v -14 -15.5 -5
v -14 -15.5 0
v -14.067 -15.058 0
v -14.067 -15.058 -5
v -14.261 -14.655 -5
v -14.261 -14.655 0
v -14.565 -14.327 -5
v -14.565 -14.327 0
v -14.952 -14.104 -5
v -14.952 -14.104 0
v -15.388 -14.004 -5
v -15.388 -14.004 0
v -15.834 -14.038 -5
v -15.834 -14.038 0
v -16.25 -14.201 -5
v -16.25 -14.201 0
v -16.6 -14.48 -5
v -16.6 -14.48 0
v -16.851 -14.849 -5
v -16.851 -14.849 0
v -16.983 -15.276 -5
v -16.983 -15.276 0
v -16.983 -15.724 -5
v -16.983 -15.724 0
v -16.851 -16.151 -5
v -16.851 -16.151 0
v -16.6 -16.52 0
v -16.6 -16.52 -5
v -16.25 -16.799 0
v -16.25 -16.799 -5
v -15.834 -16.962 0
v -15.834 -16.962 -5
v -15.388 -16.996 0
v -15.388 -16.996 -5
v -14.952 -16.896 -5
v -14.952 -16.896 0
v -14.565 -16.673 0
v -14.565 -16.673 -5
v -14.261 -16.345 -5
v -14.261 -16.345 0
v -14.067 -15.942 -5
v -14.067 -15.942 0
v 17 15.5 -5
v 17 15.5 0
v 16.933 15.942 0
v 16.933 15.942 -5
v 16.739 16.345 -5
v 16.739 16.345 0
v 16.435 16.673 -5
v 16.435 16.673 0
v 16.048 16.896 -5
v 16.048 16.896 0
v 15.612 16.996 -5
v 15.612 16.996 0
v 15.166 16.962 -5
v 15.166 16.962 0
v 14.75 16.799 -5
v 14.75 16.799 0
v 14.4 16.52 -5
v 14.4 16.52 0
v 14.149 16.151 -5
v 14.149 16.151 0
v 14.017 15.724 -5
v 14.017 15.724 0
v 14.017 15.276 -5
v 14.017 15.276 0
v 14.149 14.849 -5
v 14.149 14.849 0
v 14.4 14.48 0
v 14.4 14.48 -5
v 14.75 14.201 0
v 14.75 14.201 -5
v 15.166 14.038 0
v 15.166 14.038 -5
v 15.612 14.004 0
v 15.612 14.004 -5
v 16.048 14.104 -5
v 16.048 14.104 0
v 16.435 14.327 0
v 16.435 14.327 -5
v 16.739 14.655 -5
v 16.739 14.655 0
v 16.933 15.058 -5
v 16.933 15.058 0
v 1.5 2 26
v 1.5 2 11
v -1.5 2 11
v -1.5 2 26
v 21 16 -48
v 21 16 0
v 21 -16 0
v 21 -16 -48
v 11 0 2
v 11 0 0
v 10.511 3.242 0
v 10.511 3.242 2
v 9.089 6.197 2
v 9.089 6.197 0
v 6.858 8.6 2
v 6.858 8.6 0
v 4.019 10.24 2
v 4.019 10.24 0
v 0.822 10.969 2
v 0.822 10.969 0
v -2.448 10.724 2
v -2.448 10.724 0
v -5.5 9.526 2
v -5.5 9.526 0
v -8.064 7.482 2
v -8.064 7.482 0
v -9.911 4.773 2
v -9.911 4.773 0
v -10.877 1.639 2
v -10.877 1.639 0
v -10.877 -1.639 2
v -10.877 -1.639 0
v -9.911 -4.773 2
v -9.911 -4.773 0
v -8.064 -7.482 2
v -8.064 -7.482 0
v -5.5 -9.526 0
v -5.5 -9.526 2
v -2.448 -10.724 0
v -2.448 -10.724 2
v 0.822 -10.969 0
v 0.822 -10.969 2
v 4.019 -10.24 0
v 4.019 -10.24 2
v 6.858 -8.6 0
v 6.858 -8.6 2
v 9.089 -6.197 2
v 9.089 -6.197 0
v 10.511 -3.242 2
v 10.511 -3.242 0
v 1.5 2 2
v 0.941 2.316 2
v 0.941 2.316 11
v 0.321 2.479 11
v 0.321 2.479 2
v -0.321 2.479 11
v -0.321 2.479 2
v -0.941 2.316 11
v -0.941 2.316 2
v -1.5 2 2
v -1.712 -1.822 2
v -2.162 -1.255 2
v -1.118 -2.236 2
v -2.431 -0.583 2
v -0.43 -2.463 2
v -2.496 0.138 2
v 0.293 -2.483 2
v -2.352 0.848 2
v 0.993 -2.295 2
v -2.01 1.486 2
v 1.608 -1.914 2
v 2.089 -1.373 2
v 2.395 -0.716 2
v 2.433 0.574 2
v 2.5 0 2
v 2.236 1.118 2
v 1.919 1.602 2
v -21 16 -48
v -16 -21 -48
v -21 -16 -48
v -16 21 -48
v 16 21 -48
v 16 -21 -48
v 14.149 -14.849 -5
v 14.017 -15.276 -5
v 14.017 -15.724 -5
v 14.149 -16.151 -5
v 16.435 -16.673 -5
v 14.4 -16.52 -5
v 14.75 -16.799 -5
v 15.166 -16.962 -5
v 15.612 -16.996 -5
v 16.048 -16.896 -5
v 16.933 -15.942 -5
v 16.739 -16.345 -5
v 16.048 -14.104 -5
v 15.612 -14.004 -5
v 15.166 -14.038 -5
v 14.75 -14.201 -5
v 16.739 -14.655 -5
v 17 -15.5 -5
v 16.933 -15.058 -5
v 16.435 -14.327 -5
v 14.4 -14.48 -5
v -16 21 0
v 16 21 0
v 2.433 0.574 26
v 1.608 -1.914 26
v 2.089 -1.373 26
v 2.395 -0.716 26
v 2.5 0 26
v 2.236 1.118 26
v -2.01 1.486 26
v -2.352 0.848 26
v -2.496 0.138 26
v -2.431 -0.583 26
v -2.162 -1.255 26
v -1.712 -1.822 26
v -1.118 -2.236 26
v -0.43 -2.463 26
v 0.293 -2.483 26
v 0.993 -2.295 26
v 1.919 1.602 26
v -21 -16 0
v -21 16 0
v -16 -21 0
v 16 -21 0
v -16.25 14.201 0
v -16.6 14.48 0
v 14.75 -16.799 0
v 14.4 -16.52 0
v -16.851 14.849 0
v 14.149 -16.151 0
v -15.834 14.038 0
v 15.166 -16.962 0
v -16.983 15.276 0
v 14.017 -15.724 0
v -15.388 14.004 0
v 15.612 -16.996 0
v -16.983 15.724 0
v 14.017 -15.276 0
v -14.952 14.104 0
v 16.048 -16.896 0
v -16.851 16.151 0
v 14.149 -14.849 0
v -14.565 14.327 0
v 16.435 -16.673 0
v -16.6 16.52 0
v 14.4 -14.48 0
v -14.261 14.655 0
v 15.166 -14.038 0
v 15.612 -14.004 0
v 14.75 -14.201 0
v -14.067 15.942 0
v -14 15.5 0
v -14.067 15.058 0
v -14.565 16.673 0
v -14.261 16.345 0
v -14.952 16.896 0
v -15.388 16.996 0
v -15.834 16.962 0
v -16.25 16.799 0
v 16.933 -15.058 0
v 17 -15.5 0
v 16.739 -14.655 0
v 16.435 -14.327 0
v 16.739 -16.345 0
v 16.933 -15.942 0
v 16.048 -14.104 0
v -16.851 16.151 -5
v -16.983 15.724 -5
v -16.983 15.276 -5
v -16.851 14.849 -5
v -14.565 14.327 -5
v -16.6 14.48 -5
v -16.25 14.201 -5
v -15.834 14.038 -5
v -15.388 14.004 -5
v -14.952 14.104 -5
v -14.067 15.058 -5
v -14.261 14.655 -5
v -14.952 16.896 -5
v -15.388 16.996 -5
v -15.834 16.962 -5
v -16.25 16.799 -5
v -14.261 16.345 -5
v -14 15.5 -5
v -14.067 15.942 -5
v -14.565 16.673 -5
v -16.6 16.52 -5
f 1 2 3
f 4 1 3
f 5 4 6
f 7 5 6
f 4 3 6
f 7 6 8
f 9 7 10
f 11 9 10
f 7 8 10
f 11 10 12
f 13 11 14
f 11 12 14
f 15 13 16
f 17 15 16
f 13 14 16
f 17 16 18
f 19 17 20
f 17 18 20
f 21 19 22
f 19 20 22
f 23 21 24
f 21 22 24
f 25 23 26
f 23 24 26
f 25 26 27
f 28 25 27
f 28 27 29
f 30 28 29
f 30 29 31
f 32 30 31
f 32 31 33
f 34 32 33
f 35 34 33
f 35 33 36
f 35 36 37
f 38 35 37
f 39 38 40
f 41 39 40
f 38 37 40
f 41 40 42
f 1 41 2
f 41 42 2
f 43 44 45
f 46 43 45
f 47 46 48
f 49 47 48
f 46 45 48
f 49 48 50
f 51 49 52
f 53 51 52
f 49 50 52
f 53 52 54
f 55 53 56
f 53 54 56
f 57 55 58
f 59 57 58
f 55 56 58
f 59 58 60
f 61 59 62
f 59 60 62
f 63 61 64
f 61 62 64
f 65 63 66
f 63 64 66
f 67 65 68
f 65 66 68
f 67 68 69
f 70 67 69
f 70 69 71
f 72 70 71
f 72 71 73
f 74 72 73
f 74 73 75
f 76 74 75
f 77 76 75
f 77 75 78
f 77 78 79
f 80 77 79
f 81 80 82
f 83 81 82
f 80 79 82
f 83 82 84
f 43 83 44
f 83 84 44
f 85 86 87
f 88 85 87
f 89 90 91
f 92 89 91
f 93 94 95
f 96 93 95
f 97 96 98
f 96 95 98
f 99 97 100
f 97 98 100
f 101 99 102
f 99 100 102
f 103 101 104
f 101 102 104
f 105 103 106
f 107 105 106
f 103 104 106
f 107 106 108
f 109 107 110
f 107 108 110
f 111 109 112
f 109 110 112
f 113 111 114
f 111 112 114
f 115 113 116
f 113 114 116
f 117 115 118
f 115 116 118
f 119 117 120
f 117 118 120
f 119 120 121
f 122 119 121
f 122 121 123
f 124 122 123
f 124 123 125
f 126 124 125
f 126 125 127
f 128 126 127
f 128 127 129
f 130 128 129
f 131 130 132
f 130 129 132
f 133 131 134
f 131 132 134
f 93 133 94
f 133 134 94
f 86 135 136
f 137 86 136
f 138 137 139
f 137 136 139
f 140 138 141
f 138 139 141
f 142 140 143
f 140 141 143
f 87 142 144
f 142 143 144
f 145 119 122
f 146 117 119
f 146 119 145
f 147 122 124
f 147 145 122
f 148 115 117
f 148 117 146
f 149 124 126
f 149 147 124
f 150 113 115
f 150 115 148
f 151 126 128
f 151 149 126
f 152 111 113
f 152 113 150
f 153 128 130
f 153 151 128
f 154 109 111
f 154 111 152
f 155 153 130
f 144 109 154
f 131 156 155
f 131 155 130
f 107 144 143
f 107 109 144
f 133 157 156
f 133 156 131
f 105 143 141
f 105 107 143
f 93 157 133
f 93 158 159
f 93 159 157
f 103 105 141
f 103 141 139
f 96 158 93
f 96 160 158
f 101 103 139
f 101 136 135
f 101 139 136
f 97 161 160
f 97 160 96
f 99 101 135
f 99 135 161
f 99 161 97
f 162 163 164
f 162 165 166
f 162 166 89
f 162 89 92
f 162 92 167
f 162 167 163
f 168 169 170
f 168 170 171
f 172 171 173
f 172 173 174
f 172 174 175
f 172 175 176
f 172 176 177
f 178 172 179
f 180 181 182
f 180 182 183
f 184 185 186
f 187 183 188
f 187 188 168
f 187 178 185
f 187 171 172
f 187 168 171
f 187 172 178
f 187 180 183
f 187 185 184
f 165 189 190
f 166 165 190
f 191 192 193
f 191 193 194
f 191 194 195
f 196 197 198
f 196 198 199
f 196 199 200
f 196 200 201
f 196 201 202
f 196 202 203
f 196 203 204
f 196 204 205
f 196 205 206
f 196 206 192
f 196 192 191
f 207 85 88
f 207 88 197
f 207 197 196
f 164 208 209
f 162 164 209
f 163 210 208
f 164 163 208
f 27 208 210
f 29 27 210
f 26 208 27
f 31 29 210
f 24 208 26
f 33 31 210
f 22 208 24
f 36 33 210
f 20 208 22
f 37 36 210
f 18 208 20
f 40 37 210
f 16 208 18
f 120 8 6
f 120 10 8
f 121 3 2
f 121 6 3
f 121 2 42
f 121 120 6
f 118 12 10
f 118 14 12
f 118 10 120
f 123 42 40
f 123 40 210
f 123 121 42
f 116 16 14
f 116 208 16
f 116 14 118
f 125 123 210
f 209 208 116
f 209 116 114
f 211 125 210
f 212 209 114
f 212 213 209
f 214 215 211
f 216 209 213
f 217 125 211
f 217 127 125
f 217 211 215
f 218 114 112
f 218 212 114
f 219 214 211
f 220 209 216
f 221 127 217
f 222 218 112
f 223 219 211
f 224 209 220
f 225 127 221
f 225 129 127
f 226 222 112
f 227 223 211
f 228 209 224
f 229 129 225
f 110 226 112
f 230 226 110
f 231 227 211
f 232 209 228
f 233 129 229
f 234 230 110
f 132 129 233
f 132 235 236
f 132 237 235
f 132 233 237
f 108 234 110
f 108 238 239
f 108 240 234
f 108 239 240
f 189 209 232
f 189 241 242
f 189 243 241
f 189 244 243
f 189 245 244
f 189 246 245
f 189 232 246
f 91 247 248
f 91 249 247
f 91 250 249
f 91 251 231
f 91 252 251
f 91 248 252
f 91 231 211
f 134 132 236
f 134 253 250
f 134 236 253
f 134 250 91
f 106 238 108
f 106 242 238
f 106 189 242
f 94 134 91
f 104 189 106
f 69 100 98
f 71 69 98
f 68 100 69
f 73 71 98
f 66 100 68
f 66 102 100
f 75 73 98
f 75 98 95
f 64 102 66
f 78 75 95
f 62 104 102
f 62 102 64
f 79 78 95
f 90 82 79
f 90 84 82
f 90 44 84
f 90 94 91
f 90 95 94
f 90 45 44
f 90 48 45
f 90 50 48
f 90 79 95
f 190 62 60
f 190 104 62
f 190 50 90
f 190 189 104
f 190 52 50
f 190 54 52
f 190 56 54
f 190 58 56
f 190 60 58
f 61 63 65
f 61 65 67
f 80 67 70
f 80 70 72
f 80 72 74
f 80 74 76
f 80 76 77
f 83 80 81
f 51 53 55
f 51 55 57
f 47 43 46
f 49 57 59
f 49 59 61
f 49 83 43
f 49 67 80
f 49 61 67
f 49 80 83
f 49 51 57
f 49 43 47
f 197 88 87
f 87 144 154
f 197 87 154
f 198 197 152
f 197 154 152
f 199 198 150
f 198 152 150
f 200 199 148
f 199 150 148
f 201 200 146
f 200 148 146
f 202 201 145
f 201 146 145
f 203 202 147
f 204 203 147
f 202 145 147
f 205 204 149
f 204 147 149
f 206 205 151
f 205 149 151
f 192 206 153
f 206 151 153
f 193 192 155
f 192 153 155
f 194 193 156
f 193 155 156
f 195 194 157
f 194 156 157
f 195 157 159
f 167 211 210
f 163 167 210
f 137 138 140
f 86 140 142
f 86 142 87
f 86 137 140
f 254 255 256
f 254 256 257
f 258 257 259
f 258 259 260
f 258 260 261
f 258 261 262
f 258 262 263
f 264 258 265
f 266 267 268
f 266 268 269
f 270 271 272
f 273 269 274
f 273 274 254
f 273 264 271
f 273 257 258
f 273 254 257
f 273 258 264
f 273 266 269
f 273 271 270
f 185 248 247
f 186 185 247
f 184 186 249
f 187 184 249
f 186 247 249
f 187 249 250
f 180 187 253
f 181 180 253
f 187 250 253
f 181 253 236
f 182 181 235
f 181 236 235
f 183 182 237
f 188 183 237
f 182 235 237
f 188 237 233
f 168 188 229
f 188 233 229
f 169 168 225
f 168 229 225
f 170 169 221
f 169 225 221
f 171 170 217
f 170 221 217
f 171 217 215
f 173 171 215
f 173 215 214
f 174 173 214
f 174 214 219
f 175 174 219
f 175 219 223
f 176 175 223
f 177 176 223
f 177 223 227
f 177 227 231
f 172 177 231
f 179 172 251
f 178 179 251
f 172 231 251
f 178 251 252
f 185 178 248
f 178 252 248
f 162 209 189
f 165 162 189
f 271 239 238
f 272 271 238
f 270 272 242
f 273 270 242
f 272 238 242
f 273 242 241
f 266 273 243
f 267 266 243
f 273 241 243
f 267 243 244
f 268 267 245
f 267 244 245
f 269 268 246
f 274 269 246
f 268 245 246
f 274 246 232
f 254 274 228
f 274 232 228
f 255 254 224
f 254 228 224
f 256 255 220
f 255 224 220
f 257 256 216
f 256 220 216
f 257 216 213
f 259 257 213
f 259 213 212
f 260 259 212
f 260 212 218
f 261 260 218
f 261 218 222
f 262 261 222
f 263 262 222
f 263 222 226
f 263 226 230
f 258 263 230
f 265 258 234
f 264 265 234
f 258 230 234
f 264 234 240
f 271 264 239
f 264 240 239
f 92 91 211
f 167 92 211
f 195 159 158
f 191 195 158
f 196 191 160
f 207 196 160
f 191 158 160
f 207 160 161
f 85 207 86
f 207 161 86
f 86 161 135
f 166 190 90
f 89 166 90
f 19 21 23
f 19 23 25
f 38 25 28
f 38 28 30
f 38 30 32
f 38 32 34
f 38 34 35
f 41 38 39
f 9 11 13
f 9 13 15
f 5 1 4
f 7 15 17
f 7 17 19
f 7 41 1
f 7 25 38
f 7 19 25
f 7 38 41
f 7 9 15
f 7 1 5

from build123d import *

# Parameters (mm, degrees)
BOSS_EXTRUDE1_DEPTH = 48
SKETCH1_3_R         = 11
BOSS_EXTRUDE2_DEPTH = 2
BOSS_EXTRUDE3_DEPTH = 26
BOSS_EXTRUDE4_DEPTH = 11
SKETCH1_6_R         = 1.5
CUT_EXTRUDE1_DEPTH  = 5


with BuildPart() as part:
    # Sketch1 → Boss-Extrude1 (new body)
    with BuildSketch(Plane.XY):
        Polygon((-16, -21), (16, -21), (21, -16), (21, 16), (16, 21), (-16, 21), (-21, 16), (-21, -16), align=None)
    extrude(amount=-BOSS_EXTRUDE1_DEPTH)

    # Sketch1<3> → Boss-Extrude2 (add)
    with BuildSketch(Plane.XY):
        Circle(SKETCH1_3_R)
        with BuildLine():
            ThreePointArc((2.5, 0), (-1.118033989, -2.236067977), (-1.5, 2))
            ThreePointArc((-1.5, 2), (0, 2.5), (1.5, 2))
            ThreePointArc((1.5, 2), (2.236067977, 1.118033989), (2.5, 0))
        make_face(mode=Mode.SUBTRACT)
    extrude(amount=BOSS_EXTRUDE2_DEPTH)

    # Sketch1<4> → Boss-Extrude3 (add)
    with BuildSketch(Plane.XY):
        with BuildLine():
            Line((1.5, 2), (-1.5, 2))
            ThreePointArc((-1.5, 2), (-1.118033989, -2.236067977), (2.5, 0))
            ThreePointArc((2.5, 0), (2.236067977, 1.118033989), (1.5, 2))
        make_face()
    extrude(amount=BOSS_EXTRUDE3_DEPTH)

    # Sketch1<5> → Boss-Extrude4 (add)
    with BuildSketch(Plane.XY):
        with BuildLine():
            ThreePointArc((1.5, 2), (0, 2.5), (-1.5, 2))
            Line((-1.5, 2), (1.5, 2))
        make_face()
    extrude(amount=BOSS_EXTRUDE4_DEPTH)

    # Sketch1<6> → Cut-Extrude1 (cut)
    with BuildSketch(Plane.XY):
        with Locations((-15.5, 15.5)):
            Circle(SKETCH1_6_R)
        with Locations((15.5, 15.5)):
            Circle(SKETCH1_6_R)
        with Locations((-15.5, -15.5)):
            Circle(SKETCH1_6_R)
        with Locations((15.5, -15.5)):
            Circle(SKETCH1_6_R)
    extrude(amount=-CUT_EXTRUDE1_DEPTH, mode=Mode.SUBTRACT)


solid = part.part
